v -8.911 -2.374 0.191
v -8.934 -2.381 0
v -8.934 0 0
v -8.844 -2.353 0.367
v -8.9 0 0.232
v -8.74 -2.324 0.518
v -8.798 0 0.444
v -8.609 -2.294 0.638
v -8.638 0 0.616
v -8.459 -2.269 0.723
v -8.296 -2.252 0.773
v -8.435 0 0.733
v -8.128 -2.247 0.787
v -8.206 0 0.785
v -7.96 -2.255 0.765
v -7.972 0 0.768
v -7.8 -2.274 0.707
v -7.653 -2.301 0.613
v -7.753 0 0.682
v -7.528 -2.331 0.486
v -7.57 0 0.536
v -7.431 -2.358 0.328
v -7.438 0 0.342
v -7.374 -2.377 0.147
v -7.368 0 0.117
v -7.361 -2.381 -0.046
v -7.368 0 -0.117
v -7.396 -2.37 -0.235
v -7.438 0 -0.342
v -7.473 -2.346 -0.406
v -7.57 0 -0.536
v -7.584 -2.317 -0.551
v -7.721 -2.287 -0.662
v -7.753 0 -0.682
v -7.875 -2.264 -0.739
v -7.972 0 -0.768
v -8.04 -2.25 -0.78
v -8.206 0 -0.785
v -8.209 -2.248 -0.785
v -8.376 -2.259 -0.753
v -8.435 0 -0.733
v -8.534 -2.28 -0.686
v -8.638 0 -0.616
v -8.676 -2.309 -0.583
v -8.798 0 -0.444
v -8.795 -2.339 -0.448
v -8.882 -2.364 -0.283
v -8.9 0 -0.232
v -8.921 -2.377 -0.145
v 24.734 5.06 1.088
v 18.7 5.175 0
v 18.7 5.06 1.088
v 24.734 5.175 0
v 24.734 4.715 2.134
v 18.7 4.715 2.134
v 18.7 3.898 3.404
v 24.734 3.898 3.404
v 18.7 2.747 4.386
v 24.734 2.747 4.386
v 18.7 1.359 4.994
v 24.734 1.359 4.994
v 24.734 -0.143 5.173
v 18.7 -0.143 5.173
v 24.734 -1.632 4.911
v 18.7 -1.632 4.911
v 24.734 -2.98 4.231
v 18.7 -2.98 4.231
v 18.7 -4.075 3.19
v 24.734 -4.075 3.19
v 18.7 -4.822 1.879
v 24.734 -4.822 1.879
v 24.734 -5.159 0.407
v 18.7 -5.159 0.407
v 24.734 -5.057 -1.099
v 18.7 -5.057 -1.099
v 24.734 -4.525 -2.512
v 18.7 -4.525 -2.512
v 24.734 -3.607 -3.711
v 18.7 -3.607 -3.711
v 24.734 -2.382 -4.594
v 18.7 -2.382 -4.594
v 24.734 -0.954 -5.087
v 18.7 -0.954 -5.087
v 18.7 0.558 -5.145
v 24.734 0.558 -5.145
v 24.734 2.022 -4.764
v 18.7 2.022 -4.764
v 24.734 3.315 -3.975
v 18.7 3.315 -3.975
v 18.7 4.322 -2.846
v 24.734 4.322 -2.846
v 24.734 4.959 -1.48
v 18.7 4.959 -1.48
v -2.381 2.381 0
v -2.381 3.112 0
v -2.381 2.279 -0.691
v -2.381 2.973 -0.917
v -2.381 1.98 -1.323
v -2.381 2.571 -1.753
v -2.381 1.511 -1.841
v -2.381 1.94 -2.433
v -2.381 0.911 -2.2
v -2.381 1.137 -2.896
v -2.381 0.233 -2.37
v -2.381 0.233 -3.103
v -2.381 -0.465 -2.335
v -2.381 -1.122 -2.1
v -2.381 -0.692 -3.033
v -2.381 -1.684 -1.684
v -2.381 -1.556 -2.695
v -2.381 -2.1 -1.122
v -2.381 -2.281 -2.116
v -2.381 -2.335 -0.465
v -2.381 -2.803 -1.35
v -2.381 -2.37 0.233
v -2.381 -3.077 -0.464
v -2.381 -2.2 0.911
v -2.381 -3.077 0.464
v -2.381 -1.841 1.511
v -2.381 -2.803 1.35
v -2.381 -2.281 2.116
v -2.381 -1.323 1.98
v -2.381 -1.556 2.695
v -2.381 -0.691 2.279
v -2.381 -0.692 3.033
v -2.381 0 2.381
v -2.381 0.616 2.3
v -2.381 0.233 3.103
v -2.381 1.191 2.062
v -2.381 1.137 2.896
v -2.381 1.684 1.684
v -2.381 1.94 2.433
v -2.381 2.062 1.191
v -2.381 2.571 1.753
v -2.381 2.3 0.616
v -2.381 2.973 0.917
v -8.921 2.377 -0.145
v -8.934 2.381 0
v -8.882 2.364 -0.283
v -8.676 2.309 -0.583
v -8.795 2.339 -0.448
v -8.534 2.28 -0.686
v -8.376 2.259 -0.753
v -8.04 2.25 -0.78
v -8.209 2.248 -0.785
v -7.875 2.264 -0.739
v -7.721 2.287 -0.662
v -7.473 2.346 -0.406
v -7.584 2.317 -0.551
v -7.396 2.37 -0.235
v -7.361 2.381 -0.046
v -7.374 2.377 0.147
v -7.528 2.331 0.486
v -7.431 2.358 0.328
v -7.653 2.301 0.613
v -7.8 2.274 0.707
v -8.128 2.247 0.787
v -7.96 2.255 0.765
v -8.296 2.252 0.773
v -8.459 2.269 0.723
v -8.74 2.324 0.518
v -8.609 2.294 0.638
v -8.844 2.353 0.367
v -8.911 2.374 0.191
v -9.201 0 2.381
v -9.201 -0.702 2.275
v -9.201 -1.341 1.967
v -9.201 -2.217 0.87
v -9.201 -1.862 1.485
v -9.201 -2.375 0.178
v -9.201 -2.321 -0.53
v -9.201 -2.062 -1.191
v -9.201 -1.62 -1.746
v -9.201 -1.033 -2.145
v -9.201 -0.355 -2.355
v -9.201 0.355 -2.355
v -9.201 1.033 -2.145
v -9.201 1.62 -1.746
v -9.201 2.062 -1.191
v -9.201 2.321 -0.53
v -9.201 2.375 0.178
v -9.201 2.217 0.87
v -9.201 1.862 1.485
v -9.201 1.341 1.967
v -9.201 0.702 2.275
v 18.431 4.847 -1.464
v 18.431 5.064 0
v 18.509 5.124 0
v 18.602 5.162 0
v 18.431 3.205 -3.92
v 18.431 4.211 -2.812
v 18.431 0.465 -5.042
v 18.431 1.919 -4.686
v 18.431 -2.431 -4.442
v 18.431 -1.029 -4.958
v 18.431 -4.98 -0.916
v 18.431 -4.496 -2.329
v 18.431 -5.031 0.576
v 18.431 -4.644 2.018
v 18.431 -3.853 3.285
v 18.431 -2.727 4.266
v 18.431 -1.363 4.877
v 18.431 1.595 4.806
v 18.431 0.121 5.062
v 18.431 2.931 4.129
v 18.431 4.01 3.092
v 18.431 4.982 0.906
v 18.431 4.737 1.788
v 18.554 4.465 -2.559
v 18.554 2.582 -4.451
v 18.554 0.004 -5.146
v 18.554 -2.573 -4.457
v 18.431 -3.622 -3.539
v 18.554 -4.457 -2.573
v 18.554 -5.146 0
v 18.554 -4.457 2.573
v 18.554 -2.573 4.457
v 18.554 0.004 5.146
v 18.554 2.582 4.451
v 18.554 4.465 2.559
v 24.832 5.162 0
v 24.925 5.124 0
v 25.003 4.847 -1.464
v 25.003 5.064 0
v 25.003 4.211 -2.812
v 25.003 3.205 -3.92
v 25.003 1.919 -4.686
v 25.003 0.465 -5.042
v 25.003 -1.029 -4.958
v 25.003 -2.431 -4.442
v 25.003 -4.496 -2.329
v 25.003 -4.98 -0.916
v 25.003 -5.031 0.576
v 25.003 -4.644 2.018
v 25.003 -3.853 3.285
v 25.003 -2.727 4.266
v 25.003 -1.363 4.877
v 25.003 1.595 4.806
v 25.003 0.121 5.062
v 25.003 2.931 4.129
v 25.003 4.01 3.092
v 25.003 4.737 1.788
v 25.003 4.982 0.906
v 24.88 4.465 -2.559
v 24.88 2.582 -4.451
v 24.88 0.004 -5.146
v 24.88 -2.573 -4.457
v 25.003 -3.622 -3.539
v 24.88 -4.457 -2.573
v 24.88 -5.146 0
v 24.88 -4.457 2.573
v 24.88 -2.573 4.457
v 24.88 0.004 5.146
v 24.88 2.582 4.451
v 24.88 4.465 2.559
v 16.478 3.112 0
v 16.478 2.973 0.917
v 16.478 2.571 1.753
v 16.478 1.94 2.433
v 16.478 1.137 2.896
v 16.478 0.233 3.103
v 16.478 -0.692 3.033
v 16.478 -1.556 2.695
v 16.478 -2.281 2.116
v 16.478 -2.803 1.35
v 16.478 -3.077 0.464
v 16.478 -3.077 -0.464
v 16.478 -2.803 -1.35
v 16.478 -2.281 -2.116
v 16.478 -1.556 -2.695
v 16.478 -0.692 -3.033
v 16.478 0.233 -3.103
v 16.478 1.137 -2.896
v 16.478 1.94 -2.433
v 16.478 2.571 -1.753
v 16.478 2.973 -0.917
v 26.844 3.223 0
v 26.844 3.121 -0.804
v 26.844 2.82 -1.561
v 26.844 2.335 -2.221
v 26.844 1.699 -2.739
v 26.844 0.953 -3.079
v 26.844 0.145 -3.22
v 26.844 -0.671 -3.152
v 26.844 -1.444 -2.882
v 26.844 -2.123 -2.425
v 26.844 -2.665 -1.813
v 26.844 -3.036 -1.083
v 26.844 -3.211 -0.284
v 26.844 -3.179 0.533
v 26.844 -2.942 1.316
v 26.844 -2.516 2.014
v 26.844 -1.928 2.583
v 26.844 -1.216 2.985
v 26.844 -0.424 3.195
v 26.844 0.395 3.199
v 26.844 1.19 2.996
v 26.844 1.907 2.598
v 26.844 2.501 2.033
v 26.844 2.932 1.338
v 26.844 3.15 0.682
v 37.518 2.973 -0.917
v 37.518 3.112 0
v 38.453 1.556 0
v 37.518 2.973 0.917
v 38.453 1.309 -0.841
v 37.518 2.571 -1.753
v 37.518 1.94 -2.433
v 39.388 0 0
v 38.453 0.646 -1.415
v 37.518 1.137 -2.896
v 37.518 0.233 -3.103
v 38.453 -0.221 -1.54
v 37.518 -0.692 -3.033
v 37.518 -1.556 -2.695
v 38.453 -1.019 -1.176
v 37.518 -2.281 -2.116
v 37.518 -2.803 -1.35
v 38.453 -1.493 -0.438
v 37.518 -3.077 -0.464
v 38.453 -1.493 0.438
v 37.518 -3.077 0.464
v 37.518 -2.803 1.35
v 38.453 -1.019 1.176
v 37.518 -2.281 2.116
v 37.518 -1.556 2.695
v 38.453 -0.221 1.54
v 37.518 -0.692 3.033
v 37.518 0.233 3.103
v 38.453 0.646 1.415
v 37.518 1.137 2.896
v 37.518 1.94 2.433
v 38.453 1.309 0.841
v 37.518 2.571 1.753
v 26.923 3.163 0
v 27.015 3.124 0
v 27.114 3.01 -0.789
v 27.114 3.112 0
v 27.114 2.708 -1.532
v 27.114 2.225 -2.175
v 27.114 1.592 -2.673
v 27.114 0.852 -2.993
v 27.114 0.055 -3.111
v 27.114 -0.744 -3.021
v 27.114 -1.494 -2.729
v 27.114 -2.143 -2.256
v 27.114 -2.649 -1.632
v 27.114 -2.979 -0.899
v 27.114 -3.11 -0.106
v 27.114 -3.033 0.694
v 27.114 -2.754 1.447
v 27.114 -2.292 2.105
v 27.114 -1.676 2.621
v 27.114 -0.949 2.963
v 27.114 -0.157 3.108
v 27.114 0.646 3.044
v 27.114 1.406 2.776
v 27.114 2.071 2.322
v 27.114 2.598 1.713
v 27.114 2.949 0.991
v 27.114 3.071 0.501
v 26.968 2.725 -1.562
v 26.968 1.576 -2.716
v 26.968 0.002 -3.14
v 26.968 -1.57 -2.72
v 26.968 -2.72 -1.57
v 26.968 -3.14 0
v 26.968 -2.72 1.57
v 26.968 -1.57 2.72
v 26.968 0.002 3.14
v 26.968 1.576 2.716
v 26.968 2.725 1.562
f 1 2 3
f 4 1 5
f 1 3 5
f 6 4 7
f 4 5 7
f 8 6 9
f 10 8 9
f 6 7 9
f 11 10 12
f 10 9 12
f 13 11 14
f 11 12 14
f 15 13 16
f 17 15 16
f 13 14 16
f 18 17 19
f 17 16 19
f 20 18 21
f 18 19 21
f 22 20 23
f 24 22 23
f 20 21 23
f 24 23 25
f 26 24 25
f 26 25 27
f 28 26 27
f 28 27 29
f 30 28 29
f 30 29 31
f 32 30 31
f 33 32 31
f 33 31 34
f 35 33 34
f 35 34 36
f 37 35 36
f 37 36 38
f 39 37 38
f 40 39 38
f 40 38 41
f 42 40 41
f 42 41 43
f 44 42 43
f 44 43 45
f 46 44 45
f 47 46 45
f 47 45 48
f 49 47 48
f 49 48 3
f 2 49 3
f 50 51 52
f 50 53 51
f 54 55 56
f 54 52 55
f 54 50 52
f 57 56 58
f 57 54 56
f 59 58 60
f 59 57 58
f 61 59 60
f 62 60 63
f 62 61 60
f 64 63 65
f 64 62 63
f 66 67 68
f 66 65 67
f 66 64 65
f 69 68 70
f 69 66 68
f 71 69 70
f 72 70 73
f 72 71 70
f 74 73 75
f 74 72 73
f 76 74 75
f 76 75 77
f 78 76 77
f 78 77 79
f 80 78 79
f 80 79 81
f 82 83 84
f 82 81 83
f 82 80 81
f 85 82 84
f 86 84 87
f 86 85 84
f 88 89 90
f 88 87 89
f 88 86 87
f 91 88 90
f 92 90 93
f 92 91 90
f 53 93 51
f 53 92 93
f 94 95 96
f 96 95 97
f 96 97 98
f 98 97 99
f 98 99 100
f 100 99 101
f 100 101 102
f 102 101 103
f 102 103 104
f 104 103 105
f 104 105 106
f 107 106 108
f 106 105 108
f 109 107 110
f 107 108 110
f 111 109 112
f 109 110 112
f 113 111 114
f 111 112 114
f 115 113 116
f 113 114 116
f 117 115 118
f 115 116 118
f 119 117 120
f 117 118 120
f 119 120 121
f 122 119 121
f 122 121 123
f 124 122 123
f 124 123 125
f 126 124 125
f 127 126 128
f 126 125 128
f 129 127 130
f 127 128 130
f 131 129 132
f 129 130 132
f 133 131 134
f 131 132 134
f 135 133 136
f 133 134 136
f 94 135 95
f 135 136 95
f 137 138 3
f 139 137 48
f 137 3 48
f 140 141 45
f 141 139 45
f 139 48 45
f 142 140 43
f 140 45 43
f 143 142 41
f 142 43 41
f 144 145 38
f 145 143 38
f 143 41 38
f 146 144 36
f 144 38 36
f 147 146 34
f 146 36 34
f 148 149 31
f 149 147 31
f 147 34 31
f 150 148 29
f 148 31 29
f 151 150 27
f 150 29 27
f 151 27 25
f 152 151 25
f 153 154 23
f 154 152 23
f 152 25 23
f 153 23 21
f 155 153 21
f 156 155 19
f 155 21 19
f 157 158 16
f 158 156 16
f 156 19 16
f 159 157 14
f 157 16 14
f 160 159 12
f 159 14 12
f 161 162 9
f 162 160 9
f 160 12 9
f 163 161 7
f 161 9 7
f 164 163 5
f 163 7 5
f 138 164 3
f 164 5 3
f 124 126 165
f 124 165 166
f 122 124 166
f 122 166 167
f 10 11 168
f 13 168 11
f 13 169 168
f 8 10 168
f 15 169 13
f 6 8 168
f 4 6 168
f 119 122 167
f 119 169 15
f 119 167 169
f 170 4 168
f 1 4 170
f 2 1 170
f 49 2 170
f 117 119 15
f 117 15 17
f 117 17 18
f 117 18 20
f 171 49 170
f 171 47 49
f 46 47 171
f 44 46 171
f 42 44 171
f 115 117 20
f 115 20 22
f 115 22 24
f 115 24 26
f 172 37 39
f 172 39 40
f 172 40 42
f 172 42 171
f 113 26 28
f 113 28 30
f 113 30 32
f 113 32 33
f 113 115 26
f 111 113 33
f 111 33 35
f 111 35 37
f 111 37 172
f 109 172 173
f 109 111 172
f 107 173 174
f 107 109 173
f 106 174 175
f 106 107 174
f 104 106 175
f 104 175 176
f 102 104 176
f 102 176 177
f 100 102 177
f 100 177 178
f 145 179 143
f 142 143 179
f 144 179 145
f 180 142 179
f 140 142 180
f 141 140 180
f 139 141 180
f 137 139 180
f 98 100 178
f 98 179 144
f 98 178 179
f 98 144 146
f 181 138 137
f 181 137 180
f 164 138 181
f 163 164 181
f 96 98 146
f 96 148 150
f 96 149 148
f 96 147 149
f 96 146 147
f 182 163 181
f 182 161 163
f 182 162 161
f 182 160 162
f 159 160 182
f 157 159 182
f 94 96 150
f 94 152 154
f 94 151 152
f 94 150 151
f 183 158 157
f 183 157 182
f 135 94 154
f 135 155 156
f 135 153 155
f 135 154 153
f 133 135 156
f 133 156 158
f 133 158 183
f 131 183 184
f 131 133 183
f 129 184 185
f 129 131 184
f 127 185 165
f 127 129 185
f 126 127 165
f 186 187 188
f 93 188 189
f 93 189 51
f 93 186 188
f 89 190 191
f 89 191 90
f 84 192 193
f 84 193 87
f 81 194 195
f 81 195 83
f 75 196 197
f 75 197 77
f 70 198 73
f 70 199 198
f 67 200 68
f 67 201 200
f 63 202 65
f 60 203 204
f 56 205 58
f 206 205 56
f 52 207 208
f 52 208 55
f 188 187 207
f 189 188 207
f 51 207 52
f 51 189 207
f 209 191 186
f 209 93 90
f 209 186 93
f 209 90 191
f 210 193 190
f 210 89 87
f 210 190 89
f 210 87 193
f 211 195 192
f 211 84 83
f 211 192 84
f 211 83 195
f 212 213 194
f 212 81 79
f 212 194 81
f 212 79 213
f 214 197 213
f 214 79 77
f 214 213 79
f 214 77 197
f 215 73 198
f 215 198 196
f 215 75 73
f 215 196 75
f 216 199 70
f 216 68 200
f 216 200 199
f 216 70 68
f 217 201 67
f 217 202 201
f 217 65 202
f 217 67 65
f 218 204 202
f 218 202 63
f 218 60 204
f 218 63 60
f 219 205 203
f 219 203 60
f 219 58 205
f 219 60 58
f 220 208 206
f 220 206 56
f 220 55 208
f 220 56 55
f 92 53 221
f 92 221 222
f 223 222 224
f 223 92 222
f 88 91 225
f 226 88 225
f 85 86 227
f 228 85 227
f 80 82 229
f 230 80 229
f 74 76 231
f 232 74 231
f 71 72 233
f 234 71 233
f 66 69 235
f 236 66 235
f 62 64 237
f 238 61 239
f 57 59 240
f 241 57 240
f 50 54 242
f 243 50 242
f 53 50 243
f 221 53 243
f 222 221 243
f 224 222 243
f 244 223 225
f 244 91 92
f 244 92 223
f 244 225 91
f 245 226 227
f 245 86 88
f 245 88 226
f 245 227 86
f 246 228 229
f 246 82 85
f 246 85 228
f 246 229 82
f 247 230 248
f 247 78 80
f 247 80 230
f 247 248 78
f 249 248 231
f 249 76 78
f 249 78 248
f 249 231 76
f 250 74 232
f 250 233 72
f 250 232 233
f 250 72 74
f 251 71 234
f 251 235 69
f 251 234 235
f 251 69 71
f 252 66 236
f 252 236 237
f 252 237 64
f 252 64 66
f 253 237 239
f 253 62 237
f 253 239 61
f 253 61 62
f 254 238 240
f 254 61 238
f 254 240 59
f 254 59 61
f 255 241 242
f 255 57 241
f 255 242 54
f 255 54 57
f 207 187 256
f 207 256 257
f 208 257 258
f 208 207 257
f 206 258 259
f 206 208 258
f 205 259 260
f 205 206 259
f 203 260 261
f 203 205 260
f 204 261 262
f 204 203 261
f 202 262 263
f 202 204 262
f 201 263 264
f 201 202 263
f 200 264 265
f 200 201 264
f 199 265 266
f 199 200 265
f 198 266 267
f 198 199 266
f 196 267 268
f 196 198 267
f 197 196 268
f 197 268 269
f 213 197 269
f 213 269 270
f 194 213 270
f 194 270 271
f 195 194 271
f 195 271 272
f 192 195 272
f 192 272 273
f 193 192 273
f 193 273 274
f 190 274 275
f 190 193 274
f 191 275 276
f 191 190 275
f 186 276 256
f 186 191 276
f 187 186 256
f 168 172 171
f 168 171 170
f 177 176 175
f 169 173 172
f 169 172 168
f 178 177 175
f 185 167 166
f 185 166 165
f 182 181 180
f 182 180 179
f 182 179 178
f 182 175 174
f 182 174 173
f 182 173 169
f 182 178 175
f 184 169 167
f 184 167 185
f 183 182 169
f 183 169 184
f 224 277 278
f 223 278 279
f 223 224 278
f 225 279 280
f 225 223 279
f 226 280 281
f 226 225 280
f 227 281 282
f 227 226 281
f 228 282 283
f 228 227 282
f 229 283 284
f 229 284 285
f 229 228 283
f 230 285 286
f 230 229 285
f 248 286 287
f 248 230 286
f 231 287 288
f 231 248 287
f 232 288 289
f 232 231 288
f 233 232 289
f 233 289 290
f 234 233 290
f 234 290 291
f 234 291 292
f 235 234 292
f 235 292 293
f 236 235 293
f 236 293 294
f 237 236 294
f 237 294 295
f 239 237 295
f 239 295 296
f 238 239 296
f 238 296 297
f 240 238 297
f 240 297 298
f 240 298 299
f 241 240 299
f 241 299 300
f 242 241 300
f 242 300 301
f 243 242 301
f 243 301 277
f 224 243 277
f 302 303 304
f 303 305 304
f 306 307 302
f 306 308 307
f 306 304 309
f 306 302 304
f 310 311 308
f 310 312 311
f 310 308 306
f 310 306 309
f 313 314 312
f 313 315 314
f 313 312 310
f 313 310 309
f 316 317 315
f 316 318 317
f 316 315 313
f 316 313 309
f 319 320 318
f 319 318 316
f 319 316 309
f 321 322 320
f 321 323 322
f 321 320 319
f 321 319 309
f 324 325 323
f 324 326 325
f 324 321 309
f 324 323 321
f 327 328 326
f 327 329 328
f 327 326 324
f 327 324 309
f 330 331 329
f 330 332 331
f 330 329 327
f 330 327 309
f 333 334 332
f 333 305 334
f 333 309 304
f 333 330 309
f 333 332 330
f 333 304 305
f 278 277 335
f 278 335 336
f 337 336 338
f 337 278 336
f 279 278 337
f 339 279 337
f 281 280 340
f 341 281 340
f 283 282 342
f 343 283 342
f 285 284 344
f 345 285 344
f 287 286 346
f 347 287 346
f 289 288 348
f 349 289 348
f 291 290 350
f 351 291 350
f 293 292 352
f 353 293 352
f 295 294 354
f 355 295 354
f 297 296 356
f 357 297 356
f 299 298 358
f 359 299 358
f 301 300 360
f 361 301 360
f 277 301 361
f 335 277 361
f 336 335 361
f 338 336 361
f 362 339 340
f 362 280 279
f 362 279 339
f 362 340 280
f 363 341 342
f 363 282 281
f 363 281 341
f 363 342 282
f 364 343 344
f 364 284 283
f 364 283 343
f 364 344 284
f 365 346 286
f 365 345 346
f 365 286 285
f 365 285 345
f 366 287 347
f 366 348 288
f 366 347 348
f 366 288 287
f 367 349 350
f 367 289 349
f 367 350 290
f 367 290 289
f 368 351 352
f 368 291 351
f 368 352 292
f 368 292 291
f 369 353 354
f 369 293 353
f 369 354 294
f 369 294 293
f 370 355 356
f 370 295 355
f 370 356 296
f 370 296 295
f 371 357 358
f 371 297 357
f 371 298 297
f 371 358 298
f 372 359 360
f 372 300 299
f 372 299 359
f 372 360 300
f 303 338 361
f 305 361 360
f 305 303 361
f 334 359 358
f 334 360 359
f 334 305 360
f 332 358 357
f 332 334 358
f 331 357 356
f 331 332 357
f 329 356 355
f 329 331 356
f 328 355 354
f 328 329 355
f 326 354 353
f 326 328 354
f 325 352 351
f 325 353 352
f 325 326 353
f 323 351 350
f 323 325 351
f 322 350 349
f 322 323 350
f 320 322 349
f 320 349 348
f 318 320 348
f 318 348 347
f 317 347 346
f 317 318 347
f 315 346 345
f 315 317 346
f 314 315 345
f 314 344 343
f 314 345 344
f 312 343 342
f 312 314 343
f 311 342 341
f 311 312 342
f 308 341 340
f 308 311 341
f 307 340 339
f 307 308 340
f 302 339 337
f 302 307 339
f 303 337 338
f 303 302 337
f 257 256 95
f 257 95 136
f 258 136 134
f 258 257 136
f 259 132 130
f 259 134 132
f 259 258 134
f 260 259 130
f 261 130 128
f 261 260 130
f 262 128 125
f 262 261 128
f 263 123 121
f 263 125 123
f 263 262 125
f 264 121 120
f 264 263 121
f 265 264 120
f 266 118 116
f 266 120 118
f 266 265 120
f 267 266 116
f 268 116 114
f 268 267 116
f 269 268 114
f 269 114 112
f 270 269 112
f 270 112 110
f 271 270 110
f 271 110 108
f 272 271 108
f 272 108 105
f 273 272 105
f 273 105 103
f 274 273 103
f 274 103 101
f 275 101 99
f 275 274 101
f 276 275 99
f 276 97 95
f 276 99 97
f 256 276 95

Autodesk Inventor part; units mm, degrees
ref_plane "YZ Plane" through (0, 0, 0) normal (1, 0, 0) x (0, 1, 0)
ref_plane "XZ Plane" through (0, 0, 0) normal (0, 1, 0) x (-1, 0, 0)
ref_plane "XY Plane" through (0, 0, 0) normal (0, 0, 1) x (1, 0, 0)
sketch "Sketch1" plane through (0, 0, 0) normal (0, 0, 1) x (1, 0, 0)
  line L0 (0, 0) -> (0, 6.35)
  line L1 (0, 0) -> (7.9375, 0)
  line L2 (7.9375, 0) -> (8.1915, 0)
  line L3 (0, 6.35) -> (7.9375, 6.35) construction
  line L4 (7.9375, 6.35) -> (7.9375, 0) construction
  line L5 (0, 5.5563) -> (7.9375, 5.5563) construction
  line L6 (7.9375, 6.35) -> (7.9375, 7.9375) construction
  line L7 (7.9375, 7.9375) -> (34.2265, 7.9375) construction
  line L8 (34.2265, 0) -> (34.2265, 7.9375) construction
  line L9 (34.2265, 7.3323) -> (37.4015, 7.3323) construction
  line L10 (37.4015, 7.3323) -> (37.4015, 0) construction
  line L11 (37.4015, 0) -> (34.2265, 0)
  line L12 (37.4015, 6.35) -> (45.593, 6.35) construction
  line L13 (45.593, 6.35) -> (45.593, 0) construction
  line L14 (37.4015, 0) -> (37.6555, 0)
  line L15 (37.6555, 0) -> (45.593, 0)
  line L16 (37.6555, 0) -> (37.6555, 6.35) construction
  line L17 (7.9375, 5.5563) -> (45.593, 5.5563) construction
  line L18 (16.4059, 7.874) -> (17.6759, 7.874) construction
  line L19 (0, 3.1115) -> (26.9557, 3.1115)
  line L20 (0, 5.1753) -> (45.593, 5.1753)
  line L21 (8.1915, 0) -> (8.1915, 7.9375) construction
  line L22 (8.1915, 0) -> (8.9852, 0)
  line L23 (8.9852, 0) -> (8.9852, 7.9375) construction
  line L24 (8.9852, 7.9375) -> (8.9852, 25.0214) construction
  line L25 (8.9852, 25.0214) -> (13.7477, 25.0214) construction
  line L26 (13.7477, 25.0214) -> (13.7477, 0) construction
  line L27 (13.7477, 0) -> (8.9852, 0)
  line L28 (13.7477, 17.4625) -> (21.082, 17.4625) construction
  line L29 (13.7477, 25.0214) -> (18.5102, 25.0214) construction
  line L30 (18.5102, 25.0214) -> (18.5103, 0) construction
  line L31 (18.5103, 0) -> (13.7477, 0)
  line L32 (21.082, 17.4625) -> (21.082, 0) construction
  line L33 (21.082, 0) -> (18.5103, 0)
  line L34 (21.082, 0) -> (21.8758, 0)
  line L35 (21.8758, 0) -> (21.8758, 14.2875) construction
  line L36 (21.8758, 14.2875) -> (21.082, 14.2875) construction
  line L37 (8.1915, 7.9375) -> (8.1915, 14.2875) construction
  line L38 (8.1915, 14.2875) -> (8.9852, 14.2875) construction
  line L39 (21.8758, 30.0415) -> (26.6382, 30.0415) construction
  line L40 (26.6382, 30.0415) -> (26.6382, 0) construction
  line L41 (26.6382, 0) -> (21.8758, 0)
  line L42 (26.6382, 30.0415) -> (31.4007, 30.0415) construction
  line L43 (31.4007, 30.0415) -> (31.4007, 0) construction
  line L44 (26.6382, 0) -> (31.4007, 0)
  line L45 (26.6382, 17.4625) -> (33.9725, 17.4625) construction
  line L46 (33.9725, 17.4625) -> (33.9725, 0) construction
  line L47 (33.9725, 0) -> (31.4007, 0)
  line L48 (21.8758, 14.2875) -> (21.8758, 30.0415) construction
  line L49 (33.9725, 0) -> (34.2265, 0)
  line L50 (11.3665, 25.0214) -> (11.3665, 0) construction
  line L51 (24.257, 30.0415) -> (24.257, 0) construction
  circle A0 centre (11.3665, 7.5565) radius 2.3813 construction
  circle A1 centre (11.3665, 5.4927) radius 2.3813 construction
  line L52 (8.9893, 7.874) -> (10.2593, 7.874) construction
  circle A2 centre (24.257, 5.4927) radius 2.3812 construction
  circle A3 centre (24.257, 7.5565) radius 2.3812 construction
  line L53 (23.0177, 7.874) -> (24.0459, 7.874) construction
  line L54 (14.6367, 5.1752) -> (12.573, 3.1115) construction
  line L55 (20.9867, 5.1752) -> (23.0505, 3.1115) construction
  line L56 (10.7315, 5.1752) -> (8.6677, 3.1115) construction
  line L57 (10.4775, 5.1752) -> (8.4137, 3.1115) construction
  line L58 (0, 3.5719) -> (8.8741, 3.5719) construction
  line L59 (0, 3.5719) -> (-1.5875, 3.5719) construction
  line L60 (-1.5875, 3.5719) -> (-1.5875, 6.35) construction
  line L61 (-1.5875, 6.35) -> (0, 6.35) construction
  line L62 (26.7144, 7.9375) -> (26.7144, 0) construction
  line L63 (24.892, 5.1752) -> (26.9557, 3.1115)
  line L64 (26.7144, 5.5563) -> (28.1834, 3.1115) construction
  line L65 (16.8275, 5.1752) -> (18.8912, 3.1115) construction
  line L66 (37.5179, 3.1115) -> (37.5179, 0) construction
  line L67 (16.4782, 3.1115) -> (18.542, 5.1752)
  line L68 (69.3538, 20.0694) -> (73.1082, 25.272) construction
  line L69 (73.1082, 25.272) -> (79.491, 24.6219) construction
  line L70 (79.491, 24.6219) -> (82.1194, 18.7692) construction
  line L71 (82.1194, 18.7692) -> (78.365, 13.5666) construction
  line L72 (78.365, 13.5666) -> (71.9822, 14.2167) construction
  line L73 (71.9822, 14.2167) -> (69.3538, 20.0694) construction
  circle A4 centre (75.7366, 19.4193) radius 6.4158 construction
  line L74 (45.593, 5.5563) -> (53.7803, 5.5563) construction
  line L75 (53.7803, 5.5563) -> (53.7803, 0) construction
  line L76 (53.7803, 0) -> (45.593, 0) construction
  line L77 (28.026, 3.3734) -> (45.593, 3.3734) construction
  line L78 (31.323, 0) -> (29.4534, 3.1115)
  line L79 (37.5179, 3.1115) -> (39.3875, 0)
  line L80 (37.7719, 3.1115) -> (39.6415, 0) construction
  line L81 (8.909, 7.9375) -> (8.909, 0) construction
  line L82 (37.7719, 3.1115) -> (37.6145, 3.3734) construction
  line L83 (37.5179, 3.1115) -> (45.593, 3.1115) construction
  line L84 (26.9557, 3.1115) -> (37.5179, 3.1115)
  line L85 (0, 0) -> (-1.5875, 0)
  line L86 (-1.5875, 0) -> (-1.5875, 3.1115)
  line L87 (-1.5875, 3.1115) -> (0, 3.1115)
  line L88 (-1.5875, 0) -> (-2.3812, 0)
  line L89 (-2.3812, 0) -> (-2.3813, 3.1115)
  line L90 (-2.3813, 3.1115) -> (-1.5875, 3.1115)
  point P0 (11.3665, 3.1115)
  point P1 (11.3665, 5.1752)
  point P2 (24.257, 5.1752)
  dimension "d78" = 4.7625
  dimension "d82" = 4.7625
  dimension "d116" = 12.8316
  dimension "d40" = 0.254
  dimension "d41" = 7.9375
  dimension "d42" = 6.35
  dimension "d43" = 5.5563
  dimension "d44" = 7.9375
  dimension "d46" = 7.3323
  dimension "d47" = 3.175
  dimension "d48" = 0.254
  dimension "d49" = 6.35
  dimension "d50" = 7.9375
  dimension "d53" = 1.27
  dimension "d54" = 0.0635
  dimension "d58" = 3.1115
  dimension "d61" = 5.1753
  dimension "d63" = 0.7937
  dimension "d64" = 4.7625
  dimension "d65" = 7.3342
  dimension "d66" = 17.4625
  dimension "d67" = 4.7625
  dimension "d68" = 0.7937
  dimension "d69" = 14.2875
  dimension "d70" = 14.2875
  dimension "d71" = 4.7625
  dimension "d72" = 4.7625
  dimension "d73" = 7.3342
  dimension "d74" = 17.4625
  dimension "d75" = 0.254
  dimension "d76" = 12.8905
  dimension "d77" = 0.381
  dimension "d80" = 0.0635
  dimension "d81" = 4.7625
  dimension "d83" = 0.381
  dimension "d84" = 0.0635
  dimension "d85" = 45
  dimension "d86" = 45
  dimension "d88" = 1.2065
  dimension "d89" = 6.35
  dimension "d90" = 3.2702
  dimension "d91" = 0.635
  dimension "d92" = 45
  dimension "d93" = 0.254
  dimension "d94" = 3.5719
  dimension "d95" = 0.4604
  dimension "d96" = 1.5875
  dimension "d97" = 2.7781
  dimension "d98" = 1.6034
  dimension "d99" = 3.9053
  dimension "d101" = 3.2702
  dimension "d102" = 4.9149
  dimension "d103" = 0.635
  dimension "d105" = 59
  dimension "d106" = 2.4977
  dimension "d107" = 6.35
  dimension "d108" = 45
  dimension "d109" = 8.0645
  dimension "d110" = 10.5622
  dimension "d114" = 6.35
  dimension "d115" = 11.1125
  dimension "d117" = 5.5563
  dimension "d118" = 3.1115
  dimension "d120" = 3.3734
  dimension "d121" = 59
  dimension "d122" = 1.27
  dimension "d123" = 59
revolve "Revolution1" add sketch "Sketch1" angle 360 about axis through (21.082, 0, 0) along (-1, 0, 0) contours L85 L86 L87 L0 | L0 L19 L84 L78 L44 L41 L34 L33 L31 L27 L22 L2 L1 | L88 L89 L90 L86 | L67 L20 L63 L19 | L84 L79 L15 L14 L11 L49 L47 L44 L78
fillet "Fillet1" radius 0.381 3 edges at (18.542, -5.1752, 0) (24.892, -5.1752, 0) (26.9557, -3.1115, 0)
sketch "Sketch12" plane through (-2.3812, 0, 0) normal (-1, 0, 0) x (0, 0, 1)
  circle A0 centre (0, 0) radius 3.1115
  circle A1 centre (0, 0) radius 2.3812
  circle A2 centre (0, 0) radius 3.1115 projected
  dimension "d160" = 4.7625
extrude "Extrusion11" add sketch "Sketch12" along normal blind 6.8199 contours A1
sketch "Sketch13" plane through (0, 0, 0) normal (0, 1, 0) x (-1, 0, 0)
  line L0 (9.2011, -2.3812) -> (9.2011, 2.3812) projected
  circle A0 centre (8.1471, 0) radius 0.7874
  line L1 (0, 0) -> (8.1471, 0) construction
  line L2 (2.3813, 3.1115) -> (2.3813, -3.1115) projected
  point P0 (7.3597, 0)
  dimension "d164" = 1.5748
  dimension "d169" = 4.9784
extrude "Extrusion12" cut sketch "Sketch13" along normal through all both and the other way through all
ref_plane "Work Plane2" through (-1.5875, 0, 0) normal (-1, 0, 0) x (0, 0, 1)
properties part number "Ball Shisting Shaft Outline Sketch"
